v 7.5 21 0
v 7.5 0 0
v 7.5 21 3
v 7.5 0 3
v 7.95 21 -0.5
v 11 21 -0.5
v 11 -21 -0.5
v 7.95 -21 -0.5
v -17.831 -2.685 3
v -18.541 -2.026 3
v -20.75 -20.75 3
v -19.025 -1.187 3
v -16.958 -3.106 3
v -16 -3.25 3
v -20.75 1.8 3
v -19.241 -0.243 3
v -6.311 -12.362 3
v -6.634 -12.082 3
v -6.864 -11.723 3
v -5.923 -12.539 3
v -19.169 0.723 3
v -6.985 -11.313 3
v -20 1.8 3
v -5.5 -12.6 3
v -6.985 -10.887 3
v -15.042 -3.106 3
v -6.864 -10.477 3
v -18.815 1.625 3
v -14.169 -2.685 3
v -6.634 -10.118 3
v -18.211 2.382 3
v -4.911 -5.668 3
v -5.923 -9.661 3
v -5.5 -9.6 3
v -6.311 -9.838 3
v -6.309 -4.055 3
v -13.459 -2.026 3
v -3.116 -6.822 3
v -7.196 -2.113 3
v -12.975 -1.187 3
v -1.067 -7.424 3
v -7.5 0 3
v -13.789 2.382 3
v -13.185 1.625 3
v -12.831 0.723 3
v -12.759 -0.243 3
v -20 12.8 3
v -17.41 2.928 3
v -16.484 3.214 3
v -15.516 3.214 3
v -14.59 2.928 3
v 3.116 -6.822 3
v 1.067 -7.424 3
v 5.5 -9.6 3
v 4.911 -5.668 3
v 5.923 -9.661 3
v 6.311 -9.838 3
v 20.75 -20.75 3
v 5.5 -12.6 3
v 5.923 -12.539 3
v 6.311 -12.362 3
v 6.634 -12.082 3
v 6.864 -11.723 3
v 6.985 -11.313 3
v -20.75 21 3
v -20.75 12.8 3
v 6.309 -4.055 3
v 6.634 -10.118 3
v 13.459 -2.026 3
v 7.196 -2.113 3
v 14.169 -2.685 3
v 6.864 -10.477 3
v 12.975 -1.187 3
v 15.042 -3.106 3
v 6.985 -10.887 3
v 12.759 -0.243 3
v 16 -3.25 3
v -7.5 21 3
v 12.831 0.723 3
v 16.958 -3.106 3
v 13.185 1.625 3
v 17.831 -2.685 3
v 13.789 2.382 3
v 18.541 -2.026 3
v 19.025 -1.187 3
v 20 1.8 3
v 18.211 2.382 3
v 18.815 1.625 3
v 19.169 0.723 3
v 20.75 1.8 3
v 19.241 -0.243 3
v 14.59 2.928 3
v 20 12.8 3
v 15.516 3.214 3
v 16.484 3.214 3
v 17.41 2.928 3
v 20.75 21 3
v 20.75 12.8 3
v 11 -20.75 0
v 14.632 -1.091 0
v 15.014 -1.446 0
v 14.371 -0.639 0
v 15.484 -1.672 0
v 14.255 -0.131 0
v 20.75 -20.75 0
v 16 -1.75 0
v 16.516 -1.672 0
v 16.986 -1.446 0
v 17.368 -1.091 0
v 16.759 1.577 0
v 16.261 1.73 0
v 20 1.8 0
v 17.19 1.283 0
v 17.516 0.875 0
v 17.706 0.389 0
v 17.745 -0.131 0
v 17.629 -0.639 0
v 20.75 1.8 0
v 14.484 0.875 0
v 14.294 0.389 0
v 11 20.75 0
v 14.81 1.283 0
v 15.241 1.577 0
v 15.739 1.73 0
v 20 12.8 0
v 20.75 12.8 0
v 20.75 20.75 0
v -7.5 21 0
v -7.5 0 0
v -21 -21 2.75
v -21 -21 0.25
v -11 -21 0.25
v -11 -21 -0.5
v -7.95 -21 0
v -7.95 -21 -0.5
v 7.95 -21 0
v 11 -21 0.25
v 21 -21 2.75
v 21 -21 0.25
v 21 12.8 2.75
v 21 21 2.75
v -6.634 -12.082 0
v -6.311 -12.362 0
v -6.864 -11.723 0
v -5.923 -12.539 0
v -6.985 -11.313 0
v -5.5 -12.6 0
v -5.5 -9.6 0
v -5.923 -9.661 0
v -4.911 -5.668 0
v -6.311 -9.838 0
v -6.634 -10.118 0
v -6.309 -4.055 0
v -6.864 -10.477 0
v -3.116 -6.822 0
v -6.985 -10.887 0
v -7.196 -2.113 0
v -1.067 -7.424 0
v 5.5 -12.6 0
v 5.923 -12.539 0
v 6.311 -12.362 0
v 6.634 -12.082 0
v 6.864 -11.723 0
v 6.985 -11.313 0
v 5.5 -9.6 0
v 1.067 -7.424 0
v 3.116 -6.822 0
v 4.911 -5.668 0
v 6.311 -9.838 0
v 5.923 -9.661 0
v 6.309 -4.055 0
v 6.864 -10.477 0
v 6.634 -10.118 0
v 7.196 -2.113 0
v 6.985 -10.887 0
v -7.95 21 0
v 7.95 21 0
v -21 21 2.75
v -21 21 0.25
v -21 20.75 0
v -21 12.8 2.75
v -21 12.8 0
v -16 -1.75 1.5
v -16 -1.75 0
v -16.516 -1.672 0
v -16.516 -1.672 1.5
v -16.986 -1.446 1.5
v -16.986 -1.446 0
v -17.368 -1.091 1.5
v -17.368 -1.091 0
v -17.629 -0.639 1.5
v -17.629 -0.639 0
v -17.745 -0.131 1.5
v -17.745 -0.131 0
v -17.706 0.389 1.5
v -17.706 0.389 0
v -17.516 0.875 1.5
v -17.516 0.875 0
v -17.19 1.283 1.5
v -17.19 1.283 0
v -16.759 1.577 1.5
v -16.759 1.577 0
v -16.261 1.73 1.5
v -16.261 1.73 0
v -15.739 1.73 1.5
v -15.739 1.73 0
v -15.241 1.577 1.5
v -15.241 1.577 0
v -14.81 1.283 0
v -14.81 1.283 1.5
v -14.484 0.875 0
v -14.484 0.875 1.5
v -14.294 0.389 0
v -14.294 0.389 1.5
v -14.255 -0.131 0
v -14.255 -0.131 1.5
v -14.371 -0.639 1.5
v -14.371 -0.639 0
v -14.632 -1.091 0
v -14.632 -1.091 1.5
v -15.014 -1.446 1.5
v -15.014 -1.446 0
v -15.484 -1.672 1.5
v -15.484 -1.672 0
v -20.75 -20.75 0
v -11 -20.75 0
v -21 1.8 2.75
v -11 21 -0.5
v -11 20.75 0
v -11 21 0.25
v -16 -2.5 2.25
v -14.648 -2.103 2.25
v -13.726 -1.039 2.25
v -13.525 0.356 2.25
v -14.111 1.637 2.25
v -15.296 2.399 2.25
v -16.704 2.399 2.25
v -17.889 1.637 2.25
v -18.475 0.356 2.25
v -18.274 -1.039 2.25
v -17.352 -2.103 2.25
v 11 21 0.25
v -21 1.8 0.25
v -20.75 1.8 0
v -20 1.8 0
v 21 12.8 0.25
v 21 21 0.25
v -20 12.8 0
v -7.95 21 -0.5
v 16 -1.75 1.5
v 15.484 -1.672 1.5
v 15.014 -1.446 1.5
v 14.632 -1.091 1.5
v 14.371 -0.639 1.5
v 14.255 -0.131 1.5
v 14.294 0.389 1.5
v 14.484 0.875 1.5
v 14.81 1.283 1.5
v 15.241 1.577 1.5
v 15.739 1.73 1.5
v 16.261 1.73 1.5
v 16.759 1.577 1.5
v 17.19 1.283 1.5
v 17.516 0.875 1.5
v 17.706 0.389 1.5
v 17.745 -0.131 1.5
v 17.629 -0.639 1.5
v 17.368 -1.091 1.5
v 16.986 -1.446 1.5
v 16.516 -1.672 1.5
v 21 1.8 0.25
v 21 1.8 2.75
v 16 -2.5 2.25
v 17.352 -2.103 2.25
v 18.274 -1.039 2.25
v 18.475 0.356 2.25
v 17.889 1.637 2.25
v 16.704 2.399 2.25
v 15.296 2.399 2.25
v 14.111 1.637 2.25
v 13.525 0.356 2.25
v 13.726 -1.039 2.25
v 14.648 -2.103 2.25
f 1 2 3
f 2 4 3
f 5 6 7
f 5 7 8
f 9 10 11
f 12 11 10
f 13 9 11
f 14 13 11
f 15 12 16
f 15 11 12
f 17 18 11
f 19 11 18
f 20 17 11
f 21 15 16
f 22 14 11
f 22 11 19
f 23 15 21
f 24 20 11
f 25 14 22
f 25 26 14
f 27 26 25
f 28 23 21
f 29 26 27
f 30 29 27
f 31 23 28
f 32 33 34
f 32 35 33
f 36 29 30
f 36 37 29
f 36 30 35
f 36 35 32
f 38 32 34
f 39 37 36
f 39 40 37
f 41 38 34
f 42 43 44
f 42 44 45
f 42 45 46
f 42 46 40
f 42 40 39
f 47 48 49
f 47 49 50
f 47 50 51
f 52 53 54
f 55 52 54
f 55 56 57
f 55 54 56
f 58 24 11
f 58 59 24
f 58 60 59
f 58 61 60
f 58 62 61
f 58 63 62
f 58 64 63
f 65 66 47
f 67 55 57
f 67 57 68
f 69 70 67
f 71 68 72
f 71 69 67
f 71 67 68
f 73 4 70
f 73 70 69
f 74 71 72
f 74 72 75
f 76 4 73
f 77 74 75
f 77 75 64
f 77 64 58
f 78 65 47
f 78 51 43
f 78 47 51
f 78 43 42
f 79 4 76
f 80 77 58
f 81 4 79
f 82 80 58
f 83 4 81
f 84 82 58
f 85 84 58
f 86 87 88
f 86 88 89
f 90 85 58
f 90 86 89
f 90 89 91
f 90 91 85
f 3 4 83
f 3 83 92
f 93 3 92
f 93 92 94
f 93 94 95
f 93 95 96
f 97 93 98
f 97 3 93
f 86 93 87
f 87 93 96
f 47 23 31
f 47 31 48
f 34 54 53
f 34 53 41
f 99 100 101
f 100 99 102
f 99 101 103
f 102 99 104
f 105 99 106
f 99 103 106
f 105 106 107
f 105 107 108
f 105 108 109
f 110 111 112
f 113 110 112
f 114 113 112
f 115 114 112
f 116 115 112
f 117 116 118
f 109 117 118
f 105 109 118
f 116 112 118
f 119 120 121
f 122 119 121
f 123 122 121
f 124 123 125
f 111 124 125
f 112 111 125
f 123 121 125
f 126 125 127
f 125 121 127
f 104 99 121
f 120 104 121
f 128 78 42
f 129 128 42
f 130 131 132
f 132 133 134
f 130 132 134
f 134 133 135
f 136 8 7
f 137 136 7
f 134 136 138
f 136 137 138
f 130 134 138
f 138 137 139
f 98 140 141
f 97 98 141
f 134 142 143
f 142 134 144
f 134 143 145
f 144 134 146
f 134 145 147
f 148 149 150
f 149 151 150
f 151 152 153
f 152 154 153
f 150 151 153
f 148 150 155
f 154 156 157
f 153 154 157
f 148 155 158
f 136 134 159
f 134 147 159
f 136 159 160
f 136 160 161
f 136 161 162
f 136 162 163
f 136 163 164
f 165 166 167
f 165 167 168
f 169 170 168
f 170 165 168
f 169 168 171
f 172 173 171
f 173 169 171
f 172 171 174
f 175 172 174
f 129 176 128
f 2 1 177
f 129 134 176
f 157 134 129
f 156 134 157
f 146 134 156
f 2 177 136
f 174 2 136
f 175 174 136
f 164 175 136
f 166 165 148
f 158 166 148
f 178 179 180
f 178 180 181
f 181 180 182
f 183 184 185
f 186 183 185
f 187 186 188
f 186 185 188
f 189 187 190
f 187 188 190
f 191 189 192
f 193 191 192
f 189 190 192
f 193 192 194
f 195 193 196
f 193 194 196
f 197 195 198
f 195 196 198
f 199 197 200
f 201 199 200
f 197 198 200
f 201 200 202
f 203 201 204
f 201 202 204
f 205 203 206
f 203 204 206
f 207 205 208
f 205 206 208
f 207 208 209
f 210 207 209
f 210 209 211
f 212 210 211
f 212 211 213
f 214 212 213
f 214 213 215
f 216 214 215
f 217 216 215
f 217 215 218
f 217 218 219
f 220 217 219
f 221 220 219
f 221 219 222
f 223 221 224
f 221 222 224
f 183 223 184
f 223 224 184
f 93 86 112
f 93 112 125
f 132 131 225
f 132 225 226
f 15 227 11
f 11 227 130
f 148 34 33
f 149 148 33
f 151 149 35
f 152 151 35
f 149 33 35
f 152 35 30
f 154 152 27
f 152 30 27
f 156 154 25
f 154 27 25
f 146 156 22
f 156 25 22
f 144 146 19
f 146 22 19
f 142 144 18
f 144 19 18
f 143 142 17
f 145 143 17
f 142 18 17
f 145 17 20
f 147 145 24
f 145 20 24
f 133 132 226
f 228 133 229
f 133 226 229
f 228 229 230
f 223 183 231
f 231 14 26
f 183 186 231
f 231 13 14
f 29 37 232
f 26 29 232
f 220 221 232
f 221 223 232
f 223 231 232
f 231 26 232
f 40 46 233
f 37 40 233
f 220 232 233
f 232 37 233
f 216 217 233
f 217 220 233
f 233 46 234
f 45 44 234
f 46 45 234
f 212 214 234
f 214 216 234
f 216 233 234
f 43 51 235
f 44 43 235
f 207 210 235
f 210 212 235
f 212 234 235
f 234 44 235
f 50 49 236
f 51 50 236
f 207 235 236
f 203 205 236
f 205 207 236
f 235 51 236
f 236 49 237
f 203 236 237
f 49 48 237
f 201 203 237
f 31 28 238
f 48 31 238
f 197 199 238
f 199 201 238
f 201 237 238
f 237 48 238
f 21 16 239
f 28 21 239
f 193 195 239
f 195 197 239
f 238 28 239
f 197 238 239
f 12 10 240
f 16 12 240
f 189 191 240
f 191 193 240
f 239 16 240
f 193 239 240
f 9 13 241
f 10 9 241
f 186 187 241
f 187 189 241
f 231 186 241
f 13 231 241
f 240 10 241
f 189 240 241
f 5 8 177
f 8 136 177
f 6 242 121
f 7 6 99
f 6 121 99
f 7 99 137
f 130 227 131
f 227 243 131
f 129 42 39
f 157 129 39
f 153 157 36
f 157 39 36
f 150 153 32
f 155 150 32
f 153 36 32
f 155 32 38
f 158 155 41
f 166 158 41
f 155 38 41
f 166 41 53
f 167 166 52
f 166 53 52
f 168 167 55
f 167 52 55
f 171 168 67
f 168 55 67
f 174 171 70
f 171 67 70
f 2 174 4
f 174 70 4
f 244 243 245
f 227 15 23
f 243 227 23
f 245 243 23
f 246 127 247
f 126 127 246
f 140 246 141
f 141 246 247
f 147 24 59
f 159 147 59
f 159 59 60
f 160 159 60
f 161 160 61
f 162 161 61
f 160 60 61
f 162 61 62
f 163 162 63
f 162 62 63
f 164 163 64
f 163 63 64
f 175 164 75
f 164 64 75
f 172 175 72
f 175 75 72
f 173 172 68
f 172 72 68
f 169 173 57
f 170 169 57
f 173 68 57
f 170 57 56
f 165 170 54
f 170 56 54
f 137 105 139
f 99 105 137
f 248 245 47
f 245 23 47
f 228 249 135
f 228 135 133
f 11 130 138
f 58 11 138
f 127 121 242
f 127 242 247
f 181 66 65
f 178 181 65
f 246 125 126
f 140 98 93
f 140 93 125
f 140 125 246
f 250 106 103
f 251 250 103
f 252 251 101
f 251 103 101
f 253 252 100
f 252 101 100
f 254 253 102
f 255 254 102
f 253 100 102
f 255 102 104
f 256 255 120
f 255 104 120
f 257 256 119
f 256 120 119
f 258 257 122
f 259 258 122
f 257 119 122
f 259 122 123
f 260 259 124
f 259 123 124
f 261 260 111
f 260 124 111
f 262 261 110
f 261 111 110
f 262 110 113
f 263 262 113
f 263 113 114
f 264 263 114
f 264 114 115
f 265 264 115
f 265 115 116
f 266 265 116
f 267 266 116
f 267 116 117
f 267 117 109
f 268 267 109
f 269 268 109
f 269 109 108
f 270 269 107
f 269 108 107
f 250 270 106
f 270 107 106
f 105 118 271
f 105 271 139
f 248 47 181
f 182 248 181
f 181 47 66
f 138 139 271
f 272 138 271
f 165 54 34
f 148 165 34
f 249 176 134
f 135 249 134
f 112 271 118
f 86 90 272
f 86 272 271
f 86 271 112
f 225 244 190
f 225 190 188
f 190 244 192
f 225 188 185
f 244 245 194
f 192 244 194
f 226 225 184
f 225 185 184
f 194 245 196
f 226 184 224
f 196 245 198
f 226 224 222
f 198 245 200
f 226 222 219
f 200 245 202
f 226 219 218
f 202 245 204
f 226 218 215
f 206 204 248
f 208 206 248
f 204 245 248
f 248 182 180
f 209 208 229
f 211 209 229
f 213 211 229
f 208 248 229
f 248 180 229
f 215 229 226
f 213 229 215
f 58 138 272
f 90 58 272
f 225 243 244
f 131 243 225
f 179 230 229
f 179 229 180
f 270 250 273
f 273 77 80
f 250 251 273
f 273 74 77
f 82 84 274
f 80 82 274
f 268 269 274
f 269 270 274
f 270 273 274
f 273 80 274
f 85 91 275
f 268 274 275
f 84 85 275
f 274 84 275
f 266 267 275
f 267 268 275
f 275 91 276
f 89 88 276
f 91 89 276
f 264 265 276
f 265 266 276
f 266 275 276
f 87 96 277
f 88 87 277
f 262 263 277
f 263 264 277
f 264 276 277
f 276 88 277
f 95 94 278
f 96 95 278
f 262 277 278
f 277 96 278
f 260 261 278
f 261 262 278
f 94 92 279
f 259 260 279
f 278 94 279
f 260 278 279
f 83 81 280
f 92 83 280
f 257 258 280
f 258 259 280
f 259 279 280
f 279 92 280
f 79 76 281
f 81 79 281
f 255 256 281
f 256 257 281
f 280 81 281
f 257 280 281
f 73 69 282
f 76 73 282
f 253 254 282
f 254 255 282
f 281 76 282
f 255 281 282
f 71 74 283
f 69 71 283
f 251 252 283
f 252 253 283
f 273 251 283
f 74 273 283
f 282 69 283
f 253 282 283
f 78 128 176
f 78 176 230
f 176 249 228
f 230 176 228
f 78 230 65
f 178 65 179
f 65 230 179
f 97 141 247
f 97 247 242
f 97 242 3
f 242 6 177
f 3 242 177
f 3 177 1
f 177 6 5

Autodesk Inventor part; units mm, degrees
ref_plane "YZ Plane" through (0, 0, 0) normal (1, 0, 0) x (0, 1, 0)
ref_plane "XZ Plane" through (0, 0, 0) normal (0, 1, 0) x (-1, 0, 0)
ref_plane "XY Plane" through (0, 0, 0) normal (0, 0, 1) x (1, 0, 0)
sketch "Esquisse1" plane through (0, 0, 0) normal (0, 0, 1) x (1, 0, 0)
  line L0 (-21, -21) -> (21, -21)
  line L1 (21, -21) -> (21, 21)
  line L2 (21, 21) -> (-21, 21)
  line L3 (-21, 21) -> (-21, -21)
  point P0 (0, 0)
  dimension "d0" = 42
  dimension "d1" = 42
  dimension "d2" = 21
  dimension "d3" = 21
extrude "Extrusion1" add sketch "Esquisse1" along normal blind 3
sketch "Esquisse2" plane through (0, 0, 3) normal (0, 0, 1) x (1, 0, 0)
  line L0 (21, 1.8) -> (20, 1.8)
  line L1 (20, 1.8) -> (20, 12.8)
  line L2 (20, 12.8) -> (21, 12.8)
  line L3 (21, 12.8) -> (21, 1.8)
  line L4 (-21, 1.8) -> (-20, 1.8)
  line L5 (-20, 1.8) -> (-20, 12.8)
  line L6 (-20, 12.8) -> (-21, 12.8)
  line L7 (-21, 12.8) -> (-21, 1.8)
  line L8 (21, 21) -> (-21, 21) projected
  line L9 (-21, 21) -> (-21, -21) projected
  line L10 (21, -21) -> (21, 21) projected
  point P0 (0, 0)
  dimension "d6" = 40
  dimension "d7" = 20
  dimension "d8" = 11
  dimension "d9" = 8.2
extrude "Extrusion2" cut sketch "Esquisse2" against normal through all
sketch "Esquisse3" plane through (0, 0, 3) normal (0, 0, 1) x (1, 0, 0)
  line L0 (7.5, 0) -> (7.5, 21)
  line L1 (7.5, 21) -> (-7.5, 21)
  line L2 (-7.5, 21) -> (-7.5, 0)
  line L3 (21, 21) -> (-21, 21) projected
  arc A0 (-7.5, 0) -> (7.5, 0) centre (0, 0) ccw
  line L4 (-5.5, -11.1) -> (5.5, -11.1) construction
  line L5 (-5.5, -12.6) -> (5.5, -12.6)
  line L6 (5.5, -9.6) -> (-5.5, -9.6)
  arc A1 (-5.5, -9.6) -> (-5.5, -12.6) centre (-5.5, -11.1) ccw
  arc A2 (5.5, -12.6) -> (5.5, -9.6) centre (5.5, -11.1) ccw
  line L7 (-21, -21) -> (21, -21) projected
  point P0 (0, 0)
  point P1 (0, -11.1)
  dimension "d12" = 15
  dimension "d13" = 7.5
  dimension "d14" = 21
  dimension "d15" = 3
  dimension "d16" = 14
  dimension "d17" = 8.4
extrude "Extrusion3" cut sketch "Esquisse3" against normal through all
sketch "Esquisse4" plane through (0, 0, 0) normal (0, 0, -1) x (-1, 0, 0)
  line L0 (21, -21) -> (-21, -21) projected
  line L1 (-11, -21) -> (-7.95, -21)
  line L2 (-7.95, -21) -> (-7.95, 21)
  line L3 (-7.95, 21) -> (-11, 21)
  line L4 (-11, 21) -> (-11, -21)
  line L5 (7.95, -21) -> (11, -21)
  line L6 (11, -21) -> (11, 21)
  line L7 (11, 21) -> (7.95, 21)
  line L8 (7.95, 21) -> (7.95, -21)
  line L9 (7.5, 21) -> (21, 21) projected
  point P0 (0, 0)
  dimension "d20" = 3.05
  dimension "d21" = 3.05
  dimension "d22" = 15.9
  dimension "d23" = 7.95
extrude "Extrusion4" add sketch "Esquisse4" along normal blind 0.5
chamfer "Chanfrein1" distance 0.25 angle 45 12 edges at (16, 21, 0) (21, 16.9, 0) (16, -21, 0) (-16, -21, 0) (-21, -9.6, 0) (-16, 21, 0) (21, -9.6, 0) (-21, 16.9, 3) (-21, -9.6, 3) (0, -21, 3) (21, -9.6, 3) (21, 16.9, 3)
sketch "Esquisse5" plane through (0, 0, 3) normal (0, 0, 1) x (1, 0, 0)
  line L0 (-7.5, 21) -> (-20.75, 21) projected
  point P0 (0, 0)
  point P1 (-16, 0)
  point P2 (16, 0)
  dimension "d29" = 32
  dimension "d30" = 16
  dimension "d31" = 21
hole "Perçage1" at (-16, 0, 3) at (16, 0, 3) direction (0, 0, -1) diameter 3.5 end through all countersink diameter 6.5 countersink angle 90
equation "\"d2\" = 0.5 * d0"
equation "\"d3\" = 0.5 * d1"
equation "\"d7\" = 0.5 * d6"
equation "\"d13\" = 0.5 * d12"
equation "\"d21\" = d20"
equation "\"d23\" = 0.5 * d22"
equation "\"d30\" = 0.5 * d29"
properties part number "Plaque de maintient" material "----------"
